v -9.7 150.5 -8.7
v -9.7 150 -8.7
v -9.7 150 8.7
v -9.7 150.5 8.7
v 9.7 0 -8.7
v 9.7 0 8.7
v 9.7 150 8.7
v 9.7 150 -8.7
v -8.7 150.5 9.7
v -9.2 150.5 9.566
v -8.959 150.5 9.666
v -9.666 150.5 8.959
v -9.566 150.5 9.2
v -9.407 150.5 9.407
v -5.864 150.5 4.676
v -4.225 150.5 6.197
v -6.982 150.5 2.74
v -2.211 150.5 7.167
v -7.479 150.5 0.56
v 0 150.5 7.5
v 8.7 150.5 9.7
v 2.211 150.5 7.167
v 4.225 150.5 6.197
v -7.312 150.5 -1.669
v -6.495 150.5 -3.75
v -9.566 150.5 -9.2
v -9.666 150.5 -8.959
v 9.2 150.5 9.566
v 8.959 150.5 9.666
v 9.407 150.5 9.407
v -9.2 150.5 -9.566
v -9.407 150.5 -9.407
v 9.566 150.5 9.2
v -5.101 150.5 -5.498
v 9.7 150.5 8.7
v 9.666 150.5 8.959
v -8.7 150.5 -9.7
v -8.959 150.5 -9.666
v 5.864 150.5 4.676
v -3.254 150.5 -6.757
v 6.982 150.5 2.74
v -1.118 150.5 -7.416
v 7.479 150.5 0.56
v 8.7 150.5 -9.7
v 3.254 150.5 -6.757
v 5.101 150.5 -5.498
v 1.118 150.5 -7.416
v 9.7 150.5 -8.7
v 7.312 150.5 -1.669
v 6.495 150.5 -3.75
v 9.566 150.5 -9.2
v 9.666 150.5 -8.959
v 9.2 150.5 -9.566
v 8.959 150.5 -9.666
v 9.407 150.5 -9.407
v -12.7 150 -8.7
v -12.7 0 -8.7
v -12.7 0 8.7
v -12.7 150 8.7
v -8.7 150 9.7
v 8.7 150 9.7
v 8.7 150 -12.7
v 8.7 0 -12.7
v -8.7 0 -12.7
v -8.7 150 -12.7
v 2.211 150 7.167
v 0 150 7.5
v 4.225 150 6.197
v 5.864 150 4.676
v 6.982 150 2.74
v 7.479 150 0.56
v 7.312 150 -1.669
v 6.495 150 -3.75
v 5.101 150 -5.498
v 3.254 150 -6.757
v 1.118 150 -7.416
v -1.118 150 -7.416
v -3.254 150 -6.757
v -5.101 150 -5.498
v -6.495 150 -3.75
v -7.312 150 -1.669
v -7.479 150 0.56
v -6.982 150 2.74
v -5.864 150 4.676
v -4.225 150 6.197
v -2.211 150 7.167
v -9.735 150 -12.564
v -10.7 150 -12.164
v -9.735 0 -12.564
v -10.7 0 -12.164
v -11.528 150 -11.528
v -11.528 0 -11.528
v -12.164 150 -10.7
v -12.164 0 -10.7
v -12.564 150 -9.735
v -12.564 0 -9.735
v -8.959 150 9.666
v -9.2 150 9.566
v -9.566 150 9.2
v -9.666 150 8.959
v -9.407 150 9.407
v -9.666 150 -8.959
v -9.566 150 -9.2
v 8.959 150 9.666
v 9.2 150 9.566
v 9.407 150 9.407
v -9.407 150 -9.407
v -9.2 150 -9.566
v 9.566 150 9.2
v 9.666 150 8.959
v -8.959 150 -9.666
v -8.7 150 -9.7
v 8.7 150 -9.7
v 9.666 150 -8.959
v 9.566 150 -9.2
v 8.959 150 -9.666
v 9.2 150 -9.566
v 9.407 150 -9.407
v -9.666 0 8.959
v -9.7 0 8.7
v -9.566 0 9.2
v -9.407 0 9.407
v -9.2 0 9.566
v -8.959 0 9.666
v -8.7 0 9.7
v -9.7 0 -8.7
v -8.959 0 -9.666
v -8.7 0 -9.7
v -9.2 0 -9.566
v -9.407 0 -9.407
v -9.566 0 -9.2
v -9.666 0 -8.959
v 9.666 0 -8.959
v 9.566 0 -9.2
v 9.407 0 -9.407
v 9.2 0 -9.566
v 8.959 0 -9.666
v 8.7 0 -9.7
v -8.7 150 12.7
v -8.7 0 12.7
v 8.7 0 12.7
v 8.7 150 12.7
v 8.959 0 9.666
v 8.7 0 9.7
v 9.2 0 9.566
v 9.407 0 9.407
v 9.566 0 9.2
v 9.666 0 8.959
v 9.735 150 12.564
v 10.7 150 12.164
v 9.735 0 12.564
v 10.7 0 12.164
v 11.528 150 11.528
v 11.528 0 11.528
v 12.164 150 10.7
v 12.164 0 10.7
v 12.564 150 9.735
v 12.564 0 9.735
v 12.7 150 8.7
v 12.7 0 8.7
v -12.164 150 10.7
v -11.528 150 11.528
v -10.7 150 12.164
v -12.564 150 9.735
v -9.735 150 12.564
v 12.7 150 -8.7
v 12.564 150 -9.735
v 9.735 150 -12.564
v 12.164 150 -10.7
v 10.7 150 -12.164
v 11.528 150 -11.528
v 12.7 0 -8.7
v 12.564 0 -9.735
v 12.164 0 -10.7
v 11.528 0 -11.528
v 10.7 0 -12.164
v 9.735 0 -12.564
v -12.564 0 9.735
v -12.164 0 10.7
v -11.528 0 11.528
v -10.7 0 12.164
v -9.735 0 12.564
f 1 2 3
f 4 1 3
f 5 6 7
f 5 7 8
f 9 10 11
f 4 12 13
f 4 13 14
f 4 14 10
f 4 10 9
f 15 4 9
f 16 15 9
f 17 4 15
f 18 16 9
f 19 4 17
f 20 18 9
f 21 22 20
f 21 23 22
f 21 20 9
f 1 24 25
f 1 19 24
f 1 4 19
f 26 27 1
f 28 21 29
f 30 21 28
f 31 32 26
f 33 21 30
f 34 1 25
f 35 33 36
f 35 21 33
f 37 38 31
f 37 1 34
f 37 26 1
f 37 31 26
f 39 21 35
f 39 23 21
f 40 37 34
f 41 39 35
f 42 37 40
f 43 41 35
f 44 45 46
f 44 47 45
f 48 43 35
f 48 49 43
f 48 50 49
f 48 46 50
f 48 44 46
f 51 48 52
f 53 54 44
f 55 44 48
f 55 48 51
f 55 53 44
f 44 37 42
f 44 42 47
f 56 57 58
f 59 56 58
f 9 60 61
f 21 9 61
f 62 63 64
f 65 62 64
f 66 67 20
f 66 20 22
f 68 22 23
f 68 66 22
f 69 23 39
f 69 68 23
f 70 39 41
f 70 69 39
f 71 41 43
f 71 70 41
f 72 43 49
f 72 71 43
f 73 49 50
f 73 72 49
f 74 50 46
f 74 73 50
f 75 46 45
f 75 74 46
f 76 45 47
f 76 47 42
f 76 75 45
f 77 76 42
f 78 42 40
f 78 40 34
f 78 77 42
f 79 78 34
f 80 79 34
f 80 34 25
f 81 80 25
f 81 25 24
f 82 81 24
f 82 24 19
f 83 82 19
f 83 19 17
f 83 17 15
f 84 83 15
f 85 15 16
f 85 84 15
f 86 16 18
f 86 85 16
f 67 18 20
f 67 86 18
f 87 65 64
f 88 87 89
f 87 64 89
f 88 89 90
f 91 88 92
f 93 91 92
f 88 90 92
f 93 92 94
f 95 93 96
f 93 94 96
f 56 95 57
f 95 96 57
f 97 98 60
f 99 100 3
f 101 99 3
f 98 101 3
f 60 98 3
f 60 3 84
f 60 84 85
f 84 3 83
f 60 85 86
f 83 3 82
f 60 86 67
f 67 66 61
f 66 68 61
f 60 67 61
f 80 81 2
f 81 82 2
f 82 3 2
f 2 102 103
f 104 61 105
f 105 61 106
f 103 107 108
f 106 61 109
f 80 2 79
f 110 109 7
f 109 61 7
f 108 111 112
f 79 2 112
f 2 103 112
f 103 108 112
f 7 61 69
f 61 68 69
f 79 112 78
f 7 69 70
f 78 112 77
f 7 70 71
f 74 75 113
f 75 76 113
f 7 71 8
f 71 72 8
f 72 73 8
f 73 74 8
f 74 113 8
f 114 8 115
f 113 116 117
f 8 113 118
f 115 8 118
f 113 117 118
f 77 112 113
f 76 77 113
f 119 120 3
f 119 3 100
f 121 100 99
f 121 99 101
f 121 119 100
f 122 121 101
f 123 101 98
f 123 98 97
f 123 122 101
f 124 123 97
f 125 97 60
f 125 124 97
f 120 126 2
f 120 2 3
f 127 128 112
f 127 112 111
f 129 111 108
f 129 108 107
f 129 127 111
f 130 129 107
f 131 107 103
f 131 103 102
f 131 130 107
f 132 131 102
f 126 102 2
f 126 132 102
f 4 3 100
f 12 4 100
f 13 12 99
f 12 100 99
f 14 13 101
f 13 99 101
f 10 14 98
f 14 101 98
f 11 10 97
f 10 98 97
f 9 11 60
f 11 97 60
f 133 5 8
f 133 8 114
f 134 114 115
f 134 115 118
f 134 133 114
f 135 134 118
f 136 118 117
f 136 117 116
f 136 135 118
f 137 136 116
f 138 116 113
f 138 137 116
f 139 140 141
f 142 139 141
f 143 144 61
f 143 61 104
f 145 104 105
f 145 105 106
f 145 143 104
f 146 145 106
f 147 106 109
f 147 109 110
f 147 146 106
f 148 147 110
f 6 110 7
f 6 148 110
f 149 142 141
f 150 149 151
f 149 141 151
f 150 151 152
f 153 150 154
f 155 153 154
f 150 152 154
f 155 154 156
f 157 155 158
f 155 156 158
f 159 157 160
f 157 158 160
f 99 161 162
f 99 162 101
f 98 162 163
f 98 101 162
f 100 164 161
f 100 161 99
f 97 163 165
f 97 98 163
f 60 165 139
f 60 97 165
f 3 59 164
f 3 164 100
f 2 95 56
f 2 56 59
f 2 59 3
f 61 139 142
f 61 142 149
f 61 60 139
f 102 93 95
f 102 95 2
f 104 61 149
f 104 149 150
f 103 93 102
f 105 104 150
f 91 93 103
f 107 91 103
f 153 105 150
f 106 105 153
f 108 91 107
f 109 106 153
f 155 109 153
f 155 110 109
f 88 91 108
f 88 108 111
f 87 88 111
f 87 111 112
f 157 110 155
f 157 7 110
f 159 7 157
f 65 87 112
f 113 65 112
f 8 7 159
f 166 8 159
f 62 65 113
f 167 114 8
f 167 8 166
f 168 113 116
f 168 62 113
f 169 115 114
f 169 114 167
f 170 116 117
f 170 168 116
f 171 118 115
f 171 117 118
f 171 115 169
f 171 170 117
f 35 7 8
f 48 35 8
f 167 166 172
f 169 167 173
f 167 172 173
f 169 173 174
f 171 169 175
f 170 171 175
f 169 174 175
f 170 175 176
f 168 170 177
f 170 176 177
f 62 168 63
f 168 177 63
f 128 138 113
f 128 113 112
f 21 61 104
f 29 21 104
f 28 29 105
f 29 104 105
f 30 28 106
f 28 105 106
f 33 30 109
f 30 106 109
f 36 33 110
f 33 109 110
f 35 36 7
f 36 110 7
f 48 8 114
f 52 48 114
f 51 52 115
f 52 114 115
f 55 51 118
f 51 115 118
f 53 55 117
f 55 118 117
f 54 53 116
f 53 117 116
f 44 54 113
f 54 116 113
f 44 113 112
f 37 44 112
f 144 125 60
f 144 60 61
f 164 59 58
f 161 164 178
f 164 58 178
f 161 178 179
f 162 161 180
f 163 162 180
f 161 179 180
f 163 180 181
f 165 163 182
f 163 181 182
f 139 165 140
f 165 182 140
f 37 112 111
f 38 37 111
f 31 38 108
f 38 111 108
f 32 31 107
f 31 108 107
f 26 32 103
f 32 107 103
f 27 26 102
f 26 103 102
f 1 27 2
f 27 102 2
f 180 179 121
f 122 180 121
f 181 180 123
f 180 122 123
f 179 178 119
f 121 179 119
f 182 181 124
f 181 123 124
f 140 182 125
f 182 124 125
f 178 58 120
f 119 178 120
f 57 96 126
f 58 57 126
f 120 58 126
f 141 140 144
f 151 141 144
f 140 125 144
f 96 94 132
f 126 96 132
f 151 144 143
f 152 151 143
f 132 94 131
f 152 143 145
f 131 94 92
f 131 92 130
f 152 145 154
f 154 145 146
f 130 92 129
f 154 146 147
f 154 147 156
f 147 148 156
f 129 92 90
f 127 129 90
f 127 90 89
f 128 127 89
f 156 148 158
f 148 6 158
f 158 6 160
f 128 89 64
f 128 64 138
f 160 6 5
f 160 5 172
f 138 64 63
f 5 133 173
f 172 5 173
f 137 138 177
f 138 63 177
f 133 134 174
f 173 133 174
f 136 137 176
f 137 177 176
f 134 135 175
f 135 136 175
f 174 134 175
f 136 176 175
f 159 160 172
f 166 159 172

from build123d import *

# Parameters (mm, degrees)
SQUARE_TUBE_20_X_20_X_2_1_DEPTH = 150
SKETCH13_R                      = 7.5
BOSS_EXTRUDE1_DEPTH             = 0.5


with BuildPart() as part:
    # Sketch12 → Square tube 20 X 20 X 2(1) (new body)
    with BuildSketch(Plane(origin=(0, 0, 0), x_dir=(1, 0, 0), z_dir=(0, 1, 0))):
        with BuildLine():
            Line((-8.7, -12.7), (8.7, -12.7))
            ThreePointArc((8.7, -12.7), (11.528427125, -11.528427125), (12.7, -8.7))
            Line((12.7, -8.7), (12.7, 8.7))
            ThreePointArc((12.7, 8.7), (11.528427125, 11.528427125), (8.7, 12.7))
            Line((8.7, 12.7), (-8.7, 12.7))
            ThreePointArc((-8.7, 12.7), (-11.528427125, 11.528427125), (-12.7, 8.7))
            Line((-12.7, 8.7), (-12.7, -8.7))
            ThreePointArc((-12.7, -8.7), (-11.528427125, -11.528427125), (-8.7, -12.7))
        make_face()
        with BuildLine():
            Line((-8.7, -9.7), (8.7, -9.7))
            ThreePointArc((8.7, -9.7), (9.407106781, -9.407106781), (9.7, -8.7))
            Line((9.7, -8.7), (9.7, 8.7))
            ThreePointArc((9.7, 8.7), (9.407106781, 9.407106781), (8.7, 9.7))
            Line((8.7, 9.7), (-8.7, 9.7))
            ThreePointArc((-8.7, 9.7), (-9.407106781, 9.407106781), (-9.7, 8.7))
            Line((-9.7, 8.7), (-9.7, -8.7))
            ThreePointArc((-9.7, -8.7), (-9.407106781, -9.407106781), (-8.7, -9.7))
        make_face(mode=Mode.SUBTRACT)
    extrude(amount=SQUARE_TUBE_20_X_20_X_2_1_DEPTH)


with BuildPart() as body_2:
    # Sketch13 → Boss-Extrude1 (new body)
    with BuildSketch(Plane(origin=(0, 150, 0), x_dir=(1, 0, 0), z_dir=(0, 1, 0))):
        with BuildLine():
            Line((9.7, -8.7), (9.7, 8.7))
            ThreePointArc((9.7, 8.7), (9.407106781, 9.407106781), (8.7, 9.7))
            Line((8.7, 9.7), (-8.7, 9.7))
            ThreePointArc((-8.7, 9.7), (-9.407106781, 9.407106781), (-9.7, 8.7))
            Line((-9.7, 8.7), (-9.7, -8.7))
            ThreePointArc((-9.7, -8.7), (-9.407106781, -9.407106781), (-8.7, -9.7))
            Line((-8.7, -9.7), (8.7, -9.7))
            ThreePointArc((8.7, -9.7), (9.407106781, -9.407106781), (9.7, -8.7))
        make_face()
        with Locations(Location((0, 0, 0), (0, 0, 270))):
            Circle(SKETCH13_R, mode=Mode.SUBTRACT)
    extrude(amount=BOSS_EXTRUDE1_DEPTH)


solid = Compound([part.part, body_2.part])
